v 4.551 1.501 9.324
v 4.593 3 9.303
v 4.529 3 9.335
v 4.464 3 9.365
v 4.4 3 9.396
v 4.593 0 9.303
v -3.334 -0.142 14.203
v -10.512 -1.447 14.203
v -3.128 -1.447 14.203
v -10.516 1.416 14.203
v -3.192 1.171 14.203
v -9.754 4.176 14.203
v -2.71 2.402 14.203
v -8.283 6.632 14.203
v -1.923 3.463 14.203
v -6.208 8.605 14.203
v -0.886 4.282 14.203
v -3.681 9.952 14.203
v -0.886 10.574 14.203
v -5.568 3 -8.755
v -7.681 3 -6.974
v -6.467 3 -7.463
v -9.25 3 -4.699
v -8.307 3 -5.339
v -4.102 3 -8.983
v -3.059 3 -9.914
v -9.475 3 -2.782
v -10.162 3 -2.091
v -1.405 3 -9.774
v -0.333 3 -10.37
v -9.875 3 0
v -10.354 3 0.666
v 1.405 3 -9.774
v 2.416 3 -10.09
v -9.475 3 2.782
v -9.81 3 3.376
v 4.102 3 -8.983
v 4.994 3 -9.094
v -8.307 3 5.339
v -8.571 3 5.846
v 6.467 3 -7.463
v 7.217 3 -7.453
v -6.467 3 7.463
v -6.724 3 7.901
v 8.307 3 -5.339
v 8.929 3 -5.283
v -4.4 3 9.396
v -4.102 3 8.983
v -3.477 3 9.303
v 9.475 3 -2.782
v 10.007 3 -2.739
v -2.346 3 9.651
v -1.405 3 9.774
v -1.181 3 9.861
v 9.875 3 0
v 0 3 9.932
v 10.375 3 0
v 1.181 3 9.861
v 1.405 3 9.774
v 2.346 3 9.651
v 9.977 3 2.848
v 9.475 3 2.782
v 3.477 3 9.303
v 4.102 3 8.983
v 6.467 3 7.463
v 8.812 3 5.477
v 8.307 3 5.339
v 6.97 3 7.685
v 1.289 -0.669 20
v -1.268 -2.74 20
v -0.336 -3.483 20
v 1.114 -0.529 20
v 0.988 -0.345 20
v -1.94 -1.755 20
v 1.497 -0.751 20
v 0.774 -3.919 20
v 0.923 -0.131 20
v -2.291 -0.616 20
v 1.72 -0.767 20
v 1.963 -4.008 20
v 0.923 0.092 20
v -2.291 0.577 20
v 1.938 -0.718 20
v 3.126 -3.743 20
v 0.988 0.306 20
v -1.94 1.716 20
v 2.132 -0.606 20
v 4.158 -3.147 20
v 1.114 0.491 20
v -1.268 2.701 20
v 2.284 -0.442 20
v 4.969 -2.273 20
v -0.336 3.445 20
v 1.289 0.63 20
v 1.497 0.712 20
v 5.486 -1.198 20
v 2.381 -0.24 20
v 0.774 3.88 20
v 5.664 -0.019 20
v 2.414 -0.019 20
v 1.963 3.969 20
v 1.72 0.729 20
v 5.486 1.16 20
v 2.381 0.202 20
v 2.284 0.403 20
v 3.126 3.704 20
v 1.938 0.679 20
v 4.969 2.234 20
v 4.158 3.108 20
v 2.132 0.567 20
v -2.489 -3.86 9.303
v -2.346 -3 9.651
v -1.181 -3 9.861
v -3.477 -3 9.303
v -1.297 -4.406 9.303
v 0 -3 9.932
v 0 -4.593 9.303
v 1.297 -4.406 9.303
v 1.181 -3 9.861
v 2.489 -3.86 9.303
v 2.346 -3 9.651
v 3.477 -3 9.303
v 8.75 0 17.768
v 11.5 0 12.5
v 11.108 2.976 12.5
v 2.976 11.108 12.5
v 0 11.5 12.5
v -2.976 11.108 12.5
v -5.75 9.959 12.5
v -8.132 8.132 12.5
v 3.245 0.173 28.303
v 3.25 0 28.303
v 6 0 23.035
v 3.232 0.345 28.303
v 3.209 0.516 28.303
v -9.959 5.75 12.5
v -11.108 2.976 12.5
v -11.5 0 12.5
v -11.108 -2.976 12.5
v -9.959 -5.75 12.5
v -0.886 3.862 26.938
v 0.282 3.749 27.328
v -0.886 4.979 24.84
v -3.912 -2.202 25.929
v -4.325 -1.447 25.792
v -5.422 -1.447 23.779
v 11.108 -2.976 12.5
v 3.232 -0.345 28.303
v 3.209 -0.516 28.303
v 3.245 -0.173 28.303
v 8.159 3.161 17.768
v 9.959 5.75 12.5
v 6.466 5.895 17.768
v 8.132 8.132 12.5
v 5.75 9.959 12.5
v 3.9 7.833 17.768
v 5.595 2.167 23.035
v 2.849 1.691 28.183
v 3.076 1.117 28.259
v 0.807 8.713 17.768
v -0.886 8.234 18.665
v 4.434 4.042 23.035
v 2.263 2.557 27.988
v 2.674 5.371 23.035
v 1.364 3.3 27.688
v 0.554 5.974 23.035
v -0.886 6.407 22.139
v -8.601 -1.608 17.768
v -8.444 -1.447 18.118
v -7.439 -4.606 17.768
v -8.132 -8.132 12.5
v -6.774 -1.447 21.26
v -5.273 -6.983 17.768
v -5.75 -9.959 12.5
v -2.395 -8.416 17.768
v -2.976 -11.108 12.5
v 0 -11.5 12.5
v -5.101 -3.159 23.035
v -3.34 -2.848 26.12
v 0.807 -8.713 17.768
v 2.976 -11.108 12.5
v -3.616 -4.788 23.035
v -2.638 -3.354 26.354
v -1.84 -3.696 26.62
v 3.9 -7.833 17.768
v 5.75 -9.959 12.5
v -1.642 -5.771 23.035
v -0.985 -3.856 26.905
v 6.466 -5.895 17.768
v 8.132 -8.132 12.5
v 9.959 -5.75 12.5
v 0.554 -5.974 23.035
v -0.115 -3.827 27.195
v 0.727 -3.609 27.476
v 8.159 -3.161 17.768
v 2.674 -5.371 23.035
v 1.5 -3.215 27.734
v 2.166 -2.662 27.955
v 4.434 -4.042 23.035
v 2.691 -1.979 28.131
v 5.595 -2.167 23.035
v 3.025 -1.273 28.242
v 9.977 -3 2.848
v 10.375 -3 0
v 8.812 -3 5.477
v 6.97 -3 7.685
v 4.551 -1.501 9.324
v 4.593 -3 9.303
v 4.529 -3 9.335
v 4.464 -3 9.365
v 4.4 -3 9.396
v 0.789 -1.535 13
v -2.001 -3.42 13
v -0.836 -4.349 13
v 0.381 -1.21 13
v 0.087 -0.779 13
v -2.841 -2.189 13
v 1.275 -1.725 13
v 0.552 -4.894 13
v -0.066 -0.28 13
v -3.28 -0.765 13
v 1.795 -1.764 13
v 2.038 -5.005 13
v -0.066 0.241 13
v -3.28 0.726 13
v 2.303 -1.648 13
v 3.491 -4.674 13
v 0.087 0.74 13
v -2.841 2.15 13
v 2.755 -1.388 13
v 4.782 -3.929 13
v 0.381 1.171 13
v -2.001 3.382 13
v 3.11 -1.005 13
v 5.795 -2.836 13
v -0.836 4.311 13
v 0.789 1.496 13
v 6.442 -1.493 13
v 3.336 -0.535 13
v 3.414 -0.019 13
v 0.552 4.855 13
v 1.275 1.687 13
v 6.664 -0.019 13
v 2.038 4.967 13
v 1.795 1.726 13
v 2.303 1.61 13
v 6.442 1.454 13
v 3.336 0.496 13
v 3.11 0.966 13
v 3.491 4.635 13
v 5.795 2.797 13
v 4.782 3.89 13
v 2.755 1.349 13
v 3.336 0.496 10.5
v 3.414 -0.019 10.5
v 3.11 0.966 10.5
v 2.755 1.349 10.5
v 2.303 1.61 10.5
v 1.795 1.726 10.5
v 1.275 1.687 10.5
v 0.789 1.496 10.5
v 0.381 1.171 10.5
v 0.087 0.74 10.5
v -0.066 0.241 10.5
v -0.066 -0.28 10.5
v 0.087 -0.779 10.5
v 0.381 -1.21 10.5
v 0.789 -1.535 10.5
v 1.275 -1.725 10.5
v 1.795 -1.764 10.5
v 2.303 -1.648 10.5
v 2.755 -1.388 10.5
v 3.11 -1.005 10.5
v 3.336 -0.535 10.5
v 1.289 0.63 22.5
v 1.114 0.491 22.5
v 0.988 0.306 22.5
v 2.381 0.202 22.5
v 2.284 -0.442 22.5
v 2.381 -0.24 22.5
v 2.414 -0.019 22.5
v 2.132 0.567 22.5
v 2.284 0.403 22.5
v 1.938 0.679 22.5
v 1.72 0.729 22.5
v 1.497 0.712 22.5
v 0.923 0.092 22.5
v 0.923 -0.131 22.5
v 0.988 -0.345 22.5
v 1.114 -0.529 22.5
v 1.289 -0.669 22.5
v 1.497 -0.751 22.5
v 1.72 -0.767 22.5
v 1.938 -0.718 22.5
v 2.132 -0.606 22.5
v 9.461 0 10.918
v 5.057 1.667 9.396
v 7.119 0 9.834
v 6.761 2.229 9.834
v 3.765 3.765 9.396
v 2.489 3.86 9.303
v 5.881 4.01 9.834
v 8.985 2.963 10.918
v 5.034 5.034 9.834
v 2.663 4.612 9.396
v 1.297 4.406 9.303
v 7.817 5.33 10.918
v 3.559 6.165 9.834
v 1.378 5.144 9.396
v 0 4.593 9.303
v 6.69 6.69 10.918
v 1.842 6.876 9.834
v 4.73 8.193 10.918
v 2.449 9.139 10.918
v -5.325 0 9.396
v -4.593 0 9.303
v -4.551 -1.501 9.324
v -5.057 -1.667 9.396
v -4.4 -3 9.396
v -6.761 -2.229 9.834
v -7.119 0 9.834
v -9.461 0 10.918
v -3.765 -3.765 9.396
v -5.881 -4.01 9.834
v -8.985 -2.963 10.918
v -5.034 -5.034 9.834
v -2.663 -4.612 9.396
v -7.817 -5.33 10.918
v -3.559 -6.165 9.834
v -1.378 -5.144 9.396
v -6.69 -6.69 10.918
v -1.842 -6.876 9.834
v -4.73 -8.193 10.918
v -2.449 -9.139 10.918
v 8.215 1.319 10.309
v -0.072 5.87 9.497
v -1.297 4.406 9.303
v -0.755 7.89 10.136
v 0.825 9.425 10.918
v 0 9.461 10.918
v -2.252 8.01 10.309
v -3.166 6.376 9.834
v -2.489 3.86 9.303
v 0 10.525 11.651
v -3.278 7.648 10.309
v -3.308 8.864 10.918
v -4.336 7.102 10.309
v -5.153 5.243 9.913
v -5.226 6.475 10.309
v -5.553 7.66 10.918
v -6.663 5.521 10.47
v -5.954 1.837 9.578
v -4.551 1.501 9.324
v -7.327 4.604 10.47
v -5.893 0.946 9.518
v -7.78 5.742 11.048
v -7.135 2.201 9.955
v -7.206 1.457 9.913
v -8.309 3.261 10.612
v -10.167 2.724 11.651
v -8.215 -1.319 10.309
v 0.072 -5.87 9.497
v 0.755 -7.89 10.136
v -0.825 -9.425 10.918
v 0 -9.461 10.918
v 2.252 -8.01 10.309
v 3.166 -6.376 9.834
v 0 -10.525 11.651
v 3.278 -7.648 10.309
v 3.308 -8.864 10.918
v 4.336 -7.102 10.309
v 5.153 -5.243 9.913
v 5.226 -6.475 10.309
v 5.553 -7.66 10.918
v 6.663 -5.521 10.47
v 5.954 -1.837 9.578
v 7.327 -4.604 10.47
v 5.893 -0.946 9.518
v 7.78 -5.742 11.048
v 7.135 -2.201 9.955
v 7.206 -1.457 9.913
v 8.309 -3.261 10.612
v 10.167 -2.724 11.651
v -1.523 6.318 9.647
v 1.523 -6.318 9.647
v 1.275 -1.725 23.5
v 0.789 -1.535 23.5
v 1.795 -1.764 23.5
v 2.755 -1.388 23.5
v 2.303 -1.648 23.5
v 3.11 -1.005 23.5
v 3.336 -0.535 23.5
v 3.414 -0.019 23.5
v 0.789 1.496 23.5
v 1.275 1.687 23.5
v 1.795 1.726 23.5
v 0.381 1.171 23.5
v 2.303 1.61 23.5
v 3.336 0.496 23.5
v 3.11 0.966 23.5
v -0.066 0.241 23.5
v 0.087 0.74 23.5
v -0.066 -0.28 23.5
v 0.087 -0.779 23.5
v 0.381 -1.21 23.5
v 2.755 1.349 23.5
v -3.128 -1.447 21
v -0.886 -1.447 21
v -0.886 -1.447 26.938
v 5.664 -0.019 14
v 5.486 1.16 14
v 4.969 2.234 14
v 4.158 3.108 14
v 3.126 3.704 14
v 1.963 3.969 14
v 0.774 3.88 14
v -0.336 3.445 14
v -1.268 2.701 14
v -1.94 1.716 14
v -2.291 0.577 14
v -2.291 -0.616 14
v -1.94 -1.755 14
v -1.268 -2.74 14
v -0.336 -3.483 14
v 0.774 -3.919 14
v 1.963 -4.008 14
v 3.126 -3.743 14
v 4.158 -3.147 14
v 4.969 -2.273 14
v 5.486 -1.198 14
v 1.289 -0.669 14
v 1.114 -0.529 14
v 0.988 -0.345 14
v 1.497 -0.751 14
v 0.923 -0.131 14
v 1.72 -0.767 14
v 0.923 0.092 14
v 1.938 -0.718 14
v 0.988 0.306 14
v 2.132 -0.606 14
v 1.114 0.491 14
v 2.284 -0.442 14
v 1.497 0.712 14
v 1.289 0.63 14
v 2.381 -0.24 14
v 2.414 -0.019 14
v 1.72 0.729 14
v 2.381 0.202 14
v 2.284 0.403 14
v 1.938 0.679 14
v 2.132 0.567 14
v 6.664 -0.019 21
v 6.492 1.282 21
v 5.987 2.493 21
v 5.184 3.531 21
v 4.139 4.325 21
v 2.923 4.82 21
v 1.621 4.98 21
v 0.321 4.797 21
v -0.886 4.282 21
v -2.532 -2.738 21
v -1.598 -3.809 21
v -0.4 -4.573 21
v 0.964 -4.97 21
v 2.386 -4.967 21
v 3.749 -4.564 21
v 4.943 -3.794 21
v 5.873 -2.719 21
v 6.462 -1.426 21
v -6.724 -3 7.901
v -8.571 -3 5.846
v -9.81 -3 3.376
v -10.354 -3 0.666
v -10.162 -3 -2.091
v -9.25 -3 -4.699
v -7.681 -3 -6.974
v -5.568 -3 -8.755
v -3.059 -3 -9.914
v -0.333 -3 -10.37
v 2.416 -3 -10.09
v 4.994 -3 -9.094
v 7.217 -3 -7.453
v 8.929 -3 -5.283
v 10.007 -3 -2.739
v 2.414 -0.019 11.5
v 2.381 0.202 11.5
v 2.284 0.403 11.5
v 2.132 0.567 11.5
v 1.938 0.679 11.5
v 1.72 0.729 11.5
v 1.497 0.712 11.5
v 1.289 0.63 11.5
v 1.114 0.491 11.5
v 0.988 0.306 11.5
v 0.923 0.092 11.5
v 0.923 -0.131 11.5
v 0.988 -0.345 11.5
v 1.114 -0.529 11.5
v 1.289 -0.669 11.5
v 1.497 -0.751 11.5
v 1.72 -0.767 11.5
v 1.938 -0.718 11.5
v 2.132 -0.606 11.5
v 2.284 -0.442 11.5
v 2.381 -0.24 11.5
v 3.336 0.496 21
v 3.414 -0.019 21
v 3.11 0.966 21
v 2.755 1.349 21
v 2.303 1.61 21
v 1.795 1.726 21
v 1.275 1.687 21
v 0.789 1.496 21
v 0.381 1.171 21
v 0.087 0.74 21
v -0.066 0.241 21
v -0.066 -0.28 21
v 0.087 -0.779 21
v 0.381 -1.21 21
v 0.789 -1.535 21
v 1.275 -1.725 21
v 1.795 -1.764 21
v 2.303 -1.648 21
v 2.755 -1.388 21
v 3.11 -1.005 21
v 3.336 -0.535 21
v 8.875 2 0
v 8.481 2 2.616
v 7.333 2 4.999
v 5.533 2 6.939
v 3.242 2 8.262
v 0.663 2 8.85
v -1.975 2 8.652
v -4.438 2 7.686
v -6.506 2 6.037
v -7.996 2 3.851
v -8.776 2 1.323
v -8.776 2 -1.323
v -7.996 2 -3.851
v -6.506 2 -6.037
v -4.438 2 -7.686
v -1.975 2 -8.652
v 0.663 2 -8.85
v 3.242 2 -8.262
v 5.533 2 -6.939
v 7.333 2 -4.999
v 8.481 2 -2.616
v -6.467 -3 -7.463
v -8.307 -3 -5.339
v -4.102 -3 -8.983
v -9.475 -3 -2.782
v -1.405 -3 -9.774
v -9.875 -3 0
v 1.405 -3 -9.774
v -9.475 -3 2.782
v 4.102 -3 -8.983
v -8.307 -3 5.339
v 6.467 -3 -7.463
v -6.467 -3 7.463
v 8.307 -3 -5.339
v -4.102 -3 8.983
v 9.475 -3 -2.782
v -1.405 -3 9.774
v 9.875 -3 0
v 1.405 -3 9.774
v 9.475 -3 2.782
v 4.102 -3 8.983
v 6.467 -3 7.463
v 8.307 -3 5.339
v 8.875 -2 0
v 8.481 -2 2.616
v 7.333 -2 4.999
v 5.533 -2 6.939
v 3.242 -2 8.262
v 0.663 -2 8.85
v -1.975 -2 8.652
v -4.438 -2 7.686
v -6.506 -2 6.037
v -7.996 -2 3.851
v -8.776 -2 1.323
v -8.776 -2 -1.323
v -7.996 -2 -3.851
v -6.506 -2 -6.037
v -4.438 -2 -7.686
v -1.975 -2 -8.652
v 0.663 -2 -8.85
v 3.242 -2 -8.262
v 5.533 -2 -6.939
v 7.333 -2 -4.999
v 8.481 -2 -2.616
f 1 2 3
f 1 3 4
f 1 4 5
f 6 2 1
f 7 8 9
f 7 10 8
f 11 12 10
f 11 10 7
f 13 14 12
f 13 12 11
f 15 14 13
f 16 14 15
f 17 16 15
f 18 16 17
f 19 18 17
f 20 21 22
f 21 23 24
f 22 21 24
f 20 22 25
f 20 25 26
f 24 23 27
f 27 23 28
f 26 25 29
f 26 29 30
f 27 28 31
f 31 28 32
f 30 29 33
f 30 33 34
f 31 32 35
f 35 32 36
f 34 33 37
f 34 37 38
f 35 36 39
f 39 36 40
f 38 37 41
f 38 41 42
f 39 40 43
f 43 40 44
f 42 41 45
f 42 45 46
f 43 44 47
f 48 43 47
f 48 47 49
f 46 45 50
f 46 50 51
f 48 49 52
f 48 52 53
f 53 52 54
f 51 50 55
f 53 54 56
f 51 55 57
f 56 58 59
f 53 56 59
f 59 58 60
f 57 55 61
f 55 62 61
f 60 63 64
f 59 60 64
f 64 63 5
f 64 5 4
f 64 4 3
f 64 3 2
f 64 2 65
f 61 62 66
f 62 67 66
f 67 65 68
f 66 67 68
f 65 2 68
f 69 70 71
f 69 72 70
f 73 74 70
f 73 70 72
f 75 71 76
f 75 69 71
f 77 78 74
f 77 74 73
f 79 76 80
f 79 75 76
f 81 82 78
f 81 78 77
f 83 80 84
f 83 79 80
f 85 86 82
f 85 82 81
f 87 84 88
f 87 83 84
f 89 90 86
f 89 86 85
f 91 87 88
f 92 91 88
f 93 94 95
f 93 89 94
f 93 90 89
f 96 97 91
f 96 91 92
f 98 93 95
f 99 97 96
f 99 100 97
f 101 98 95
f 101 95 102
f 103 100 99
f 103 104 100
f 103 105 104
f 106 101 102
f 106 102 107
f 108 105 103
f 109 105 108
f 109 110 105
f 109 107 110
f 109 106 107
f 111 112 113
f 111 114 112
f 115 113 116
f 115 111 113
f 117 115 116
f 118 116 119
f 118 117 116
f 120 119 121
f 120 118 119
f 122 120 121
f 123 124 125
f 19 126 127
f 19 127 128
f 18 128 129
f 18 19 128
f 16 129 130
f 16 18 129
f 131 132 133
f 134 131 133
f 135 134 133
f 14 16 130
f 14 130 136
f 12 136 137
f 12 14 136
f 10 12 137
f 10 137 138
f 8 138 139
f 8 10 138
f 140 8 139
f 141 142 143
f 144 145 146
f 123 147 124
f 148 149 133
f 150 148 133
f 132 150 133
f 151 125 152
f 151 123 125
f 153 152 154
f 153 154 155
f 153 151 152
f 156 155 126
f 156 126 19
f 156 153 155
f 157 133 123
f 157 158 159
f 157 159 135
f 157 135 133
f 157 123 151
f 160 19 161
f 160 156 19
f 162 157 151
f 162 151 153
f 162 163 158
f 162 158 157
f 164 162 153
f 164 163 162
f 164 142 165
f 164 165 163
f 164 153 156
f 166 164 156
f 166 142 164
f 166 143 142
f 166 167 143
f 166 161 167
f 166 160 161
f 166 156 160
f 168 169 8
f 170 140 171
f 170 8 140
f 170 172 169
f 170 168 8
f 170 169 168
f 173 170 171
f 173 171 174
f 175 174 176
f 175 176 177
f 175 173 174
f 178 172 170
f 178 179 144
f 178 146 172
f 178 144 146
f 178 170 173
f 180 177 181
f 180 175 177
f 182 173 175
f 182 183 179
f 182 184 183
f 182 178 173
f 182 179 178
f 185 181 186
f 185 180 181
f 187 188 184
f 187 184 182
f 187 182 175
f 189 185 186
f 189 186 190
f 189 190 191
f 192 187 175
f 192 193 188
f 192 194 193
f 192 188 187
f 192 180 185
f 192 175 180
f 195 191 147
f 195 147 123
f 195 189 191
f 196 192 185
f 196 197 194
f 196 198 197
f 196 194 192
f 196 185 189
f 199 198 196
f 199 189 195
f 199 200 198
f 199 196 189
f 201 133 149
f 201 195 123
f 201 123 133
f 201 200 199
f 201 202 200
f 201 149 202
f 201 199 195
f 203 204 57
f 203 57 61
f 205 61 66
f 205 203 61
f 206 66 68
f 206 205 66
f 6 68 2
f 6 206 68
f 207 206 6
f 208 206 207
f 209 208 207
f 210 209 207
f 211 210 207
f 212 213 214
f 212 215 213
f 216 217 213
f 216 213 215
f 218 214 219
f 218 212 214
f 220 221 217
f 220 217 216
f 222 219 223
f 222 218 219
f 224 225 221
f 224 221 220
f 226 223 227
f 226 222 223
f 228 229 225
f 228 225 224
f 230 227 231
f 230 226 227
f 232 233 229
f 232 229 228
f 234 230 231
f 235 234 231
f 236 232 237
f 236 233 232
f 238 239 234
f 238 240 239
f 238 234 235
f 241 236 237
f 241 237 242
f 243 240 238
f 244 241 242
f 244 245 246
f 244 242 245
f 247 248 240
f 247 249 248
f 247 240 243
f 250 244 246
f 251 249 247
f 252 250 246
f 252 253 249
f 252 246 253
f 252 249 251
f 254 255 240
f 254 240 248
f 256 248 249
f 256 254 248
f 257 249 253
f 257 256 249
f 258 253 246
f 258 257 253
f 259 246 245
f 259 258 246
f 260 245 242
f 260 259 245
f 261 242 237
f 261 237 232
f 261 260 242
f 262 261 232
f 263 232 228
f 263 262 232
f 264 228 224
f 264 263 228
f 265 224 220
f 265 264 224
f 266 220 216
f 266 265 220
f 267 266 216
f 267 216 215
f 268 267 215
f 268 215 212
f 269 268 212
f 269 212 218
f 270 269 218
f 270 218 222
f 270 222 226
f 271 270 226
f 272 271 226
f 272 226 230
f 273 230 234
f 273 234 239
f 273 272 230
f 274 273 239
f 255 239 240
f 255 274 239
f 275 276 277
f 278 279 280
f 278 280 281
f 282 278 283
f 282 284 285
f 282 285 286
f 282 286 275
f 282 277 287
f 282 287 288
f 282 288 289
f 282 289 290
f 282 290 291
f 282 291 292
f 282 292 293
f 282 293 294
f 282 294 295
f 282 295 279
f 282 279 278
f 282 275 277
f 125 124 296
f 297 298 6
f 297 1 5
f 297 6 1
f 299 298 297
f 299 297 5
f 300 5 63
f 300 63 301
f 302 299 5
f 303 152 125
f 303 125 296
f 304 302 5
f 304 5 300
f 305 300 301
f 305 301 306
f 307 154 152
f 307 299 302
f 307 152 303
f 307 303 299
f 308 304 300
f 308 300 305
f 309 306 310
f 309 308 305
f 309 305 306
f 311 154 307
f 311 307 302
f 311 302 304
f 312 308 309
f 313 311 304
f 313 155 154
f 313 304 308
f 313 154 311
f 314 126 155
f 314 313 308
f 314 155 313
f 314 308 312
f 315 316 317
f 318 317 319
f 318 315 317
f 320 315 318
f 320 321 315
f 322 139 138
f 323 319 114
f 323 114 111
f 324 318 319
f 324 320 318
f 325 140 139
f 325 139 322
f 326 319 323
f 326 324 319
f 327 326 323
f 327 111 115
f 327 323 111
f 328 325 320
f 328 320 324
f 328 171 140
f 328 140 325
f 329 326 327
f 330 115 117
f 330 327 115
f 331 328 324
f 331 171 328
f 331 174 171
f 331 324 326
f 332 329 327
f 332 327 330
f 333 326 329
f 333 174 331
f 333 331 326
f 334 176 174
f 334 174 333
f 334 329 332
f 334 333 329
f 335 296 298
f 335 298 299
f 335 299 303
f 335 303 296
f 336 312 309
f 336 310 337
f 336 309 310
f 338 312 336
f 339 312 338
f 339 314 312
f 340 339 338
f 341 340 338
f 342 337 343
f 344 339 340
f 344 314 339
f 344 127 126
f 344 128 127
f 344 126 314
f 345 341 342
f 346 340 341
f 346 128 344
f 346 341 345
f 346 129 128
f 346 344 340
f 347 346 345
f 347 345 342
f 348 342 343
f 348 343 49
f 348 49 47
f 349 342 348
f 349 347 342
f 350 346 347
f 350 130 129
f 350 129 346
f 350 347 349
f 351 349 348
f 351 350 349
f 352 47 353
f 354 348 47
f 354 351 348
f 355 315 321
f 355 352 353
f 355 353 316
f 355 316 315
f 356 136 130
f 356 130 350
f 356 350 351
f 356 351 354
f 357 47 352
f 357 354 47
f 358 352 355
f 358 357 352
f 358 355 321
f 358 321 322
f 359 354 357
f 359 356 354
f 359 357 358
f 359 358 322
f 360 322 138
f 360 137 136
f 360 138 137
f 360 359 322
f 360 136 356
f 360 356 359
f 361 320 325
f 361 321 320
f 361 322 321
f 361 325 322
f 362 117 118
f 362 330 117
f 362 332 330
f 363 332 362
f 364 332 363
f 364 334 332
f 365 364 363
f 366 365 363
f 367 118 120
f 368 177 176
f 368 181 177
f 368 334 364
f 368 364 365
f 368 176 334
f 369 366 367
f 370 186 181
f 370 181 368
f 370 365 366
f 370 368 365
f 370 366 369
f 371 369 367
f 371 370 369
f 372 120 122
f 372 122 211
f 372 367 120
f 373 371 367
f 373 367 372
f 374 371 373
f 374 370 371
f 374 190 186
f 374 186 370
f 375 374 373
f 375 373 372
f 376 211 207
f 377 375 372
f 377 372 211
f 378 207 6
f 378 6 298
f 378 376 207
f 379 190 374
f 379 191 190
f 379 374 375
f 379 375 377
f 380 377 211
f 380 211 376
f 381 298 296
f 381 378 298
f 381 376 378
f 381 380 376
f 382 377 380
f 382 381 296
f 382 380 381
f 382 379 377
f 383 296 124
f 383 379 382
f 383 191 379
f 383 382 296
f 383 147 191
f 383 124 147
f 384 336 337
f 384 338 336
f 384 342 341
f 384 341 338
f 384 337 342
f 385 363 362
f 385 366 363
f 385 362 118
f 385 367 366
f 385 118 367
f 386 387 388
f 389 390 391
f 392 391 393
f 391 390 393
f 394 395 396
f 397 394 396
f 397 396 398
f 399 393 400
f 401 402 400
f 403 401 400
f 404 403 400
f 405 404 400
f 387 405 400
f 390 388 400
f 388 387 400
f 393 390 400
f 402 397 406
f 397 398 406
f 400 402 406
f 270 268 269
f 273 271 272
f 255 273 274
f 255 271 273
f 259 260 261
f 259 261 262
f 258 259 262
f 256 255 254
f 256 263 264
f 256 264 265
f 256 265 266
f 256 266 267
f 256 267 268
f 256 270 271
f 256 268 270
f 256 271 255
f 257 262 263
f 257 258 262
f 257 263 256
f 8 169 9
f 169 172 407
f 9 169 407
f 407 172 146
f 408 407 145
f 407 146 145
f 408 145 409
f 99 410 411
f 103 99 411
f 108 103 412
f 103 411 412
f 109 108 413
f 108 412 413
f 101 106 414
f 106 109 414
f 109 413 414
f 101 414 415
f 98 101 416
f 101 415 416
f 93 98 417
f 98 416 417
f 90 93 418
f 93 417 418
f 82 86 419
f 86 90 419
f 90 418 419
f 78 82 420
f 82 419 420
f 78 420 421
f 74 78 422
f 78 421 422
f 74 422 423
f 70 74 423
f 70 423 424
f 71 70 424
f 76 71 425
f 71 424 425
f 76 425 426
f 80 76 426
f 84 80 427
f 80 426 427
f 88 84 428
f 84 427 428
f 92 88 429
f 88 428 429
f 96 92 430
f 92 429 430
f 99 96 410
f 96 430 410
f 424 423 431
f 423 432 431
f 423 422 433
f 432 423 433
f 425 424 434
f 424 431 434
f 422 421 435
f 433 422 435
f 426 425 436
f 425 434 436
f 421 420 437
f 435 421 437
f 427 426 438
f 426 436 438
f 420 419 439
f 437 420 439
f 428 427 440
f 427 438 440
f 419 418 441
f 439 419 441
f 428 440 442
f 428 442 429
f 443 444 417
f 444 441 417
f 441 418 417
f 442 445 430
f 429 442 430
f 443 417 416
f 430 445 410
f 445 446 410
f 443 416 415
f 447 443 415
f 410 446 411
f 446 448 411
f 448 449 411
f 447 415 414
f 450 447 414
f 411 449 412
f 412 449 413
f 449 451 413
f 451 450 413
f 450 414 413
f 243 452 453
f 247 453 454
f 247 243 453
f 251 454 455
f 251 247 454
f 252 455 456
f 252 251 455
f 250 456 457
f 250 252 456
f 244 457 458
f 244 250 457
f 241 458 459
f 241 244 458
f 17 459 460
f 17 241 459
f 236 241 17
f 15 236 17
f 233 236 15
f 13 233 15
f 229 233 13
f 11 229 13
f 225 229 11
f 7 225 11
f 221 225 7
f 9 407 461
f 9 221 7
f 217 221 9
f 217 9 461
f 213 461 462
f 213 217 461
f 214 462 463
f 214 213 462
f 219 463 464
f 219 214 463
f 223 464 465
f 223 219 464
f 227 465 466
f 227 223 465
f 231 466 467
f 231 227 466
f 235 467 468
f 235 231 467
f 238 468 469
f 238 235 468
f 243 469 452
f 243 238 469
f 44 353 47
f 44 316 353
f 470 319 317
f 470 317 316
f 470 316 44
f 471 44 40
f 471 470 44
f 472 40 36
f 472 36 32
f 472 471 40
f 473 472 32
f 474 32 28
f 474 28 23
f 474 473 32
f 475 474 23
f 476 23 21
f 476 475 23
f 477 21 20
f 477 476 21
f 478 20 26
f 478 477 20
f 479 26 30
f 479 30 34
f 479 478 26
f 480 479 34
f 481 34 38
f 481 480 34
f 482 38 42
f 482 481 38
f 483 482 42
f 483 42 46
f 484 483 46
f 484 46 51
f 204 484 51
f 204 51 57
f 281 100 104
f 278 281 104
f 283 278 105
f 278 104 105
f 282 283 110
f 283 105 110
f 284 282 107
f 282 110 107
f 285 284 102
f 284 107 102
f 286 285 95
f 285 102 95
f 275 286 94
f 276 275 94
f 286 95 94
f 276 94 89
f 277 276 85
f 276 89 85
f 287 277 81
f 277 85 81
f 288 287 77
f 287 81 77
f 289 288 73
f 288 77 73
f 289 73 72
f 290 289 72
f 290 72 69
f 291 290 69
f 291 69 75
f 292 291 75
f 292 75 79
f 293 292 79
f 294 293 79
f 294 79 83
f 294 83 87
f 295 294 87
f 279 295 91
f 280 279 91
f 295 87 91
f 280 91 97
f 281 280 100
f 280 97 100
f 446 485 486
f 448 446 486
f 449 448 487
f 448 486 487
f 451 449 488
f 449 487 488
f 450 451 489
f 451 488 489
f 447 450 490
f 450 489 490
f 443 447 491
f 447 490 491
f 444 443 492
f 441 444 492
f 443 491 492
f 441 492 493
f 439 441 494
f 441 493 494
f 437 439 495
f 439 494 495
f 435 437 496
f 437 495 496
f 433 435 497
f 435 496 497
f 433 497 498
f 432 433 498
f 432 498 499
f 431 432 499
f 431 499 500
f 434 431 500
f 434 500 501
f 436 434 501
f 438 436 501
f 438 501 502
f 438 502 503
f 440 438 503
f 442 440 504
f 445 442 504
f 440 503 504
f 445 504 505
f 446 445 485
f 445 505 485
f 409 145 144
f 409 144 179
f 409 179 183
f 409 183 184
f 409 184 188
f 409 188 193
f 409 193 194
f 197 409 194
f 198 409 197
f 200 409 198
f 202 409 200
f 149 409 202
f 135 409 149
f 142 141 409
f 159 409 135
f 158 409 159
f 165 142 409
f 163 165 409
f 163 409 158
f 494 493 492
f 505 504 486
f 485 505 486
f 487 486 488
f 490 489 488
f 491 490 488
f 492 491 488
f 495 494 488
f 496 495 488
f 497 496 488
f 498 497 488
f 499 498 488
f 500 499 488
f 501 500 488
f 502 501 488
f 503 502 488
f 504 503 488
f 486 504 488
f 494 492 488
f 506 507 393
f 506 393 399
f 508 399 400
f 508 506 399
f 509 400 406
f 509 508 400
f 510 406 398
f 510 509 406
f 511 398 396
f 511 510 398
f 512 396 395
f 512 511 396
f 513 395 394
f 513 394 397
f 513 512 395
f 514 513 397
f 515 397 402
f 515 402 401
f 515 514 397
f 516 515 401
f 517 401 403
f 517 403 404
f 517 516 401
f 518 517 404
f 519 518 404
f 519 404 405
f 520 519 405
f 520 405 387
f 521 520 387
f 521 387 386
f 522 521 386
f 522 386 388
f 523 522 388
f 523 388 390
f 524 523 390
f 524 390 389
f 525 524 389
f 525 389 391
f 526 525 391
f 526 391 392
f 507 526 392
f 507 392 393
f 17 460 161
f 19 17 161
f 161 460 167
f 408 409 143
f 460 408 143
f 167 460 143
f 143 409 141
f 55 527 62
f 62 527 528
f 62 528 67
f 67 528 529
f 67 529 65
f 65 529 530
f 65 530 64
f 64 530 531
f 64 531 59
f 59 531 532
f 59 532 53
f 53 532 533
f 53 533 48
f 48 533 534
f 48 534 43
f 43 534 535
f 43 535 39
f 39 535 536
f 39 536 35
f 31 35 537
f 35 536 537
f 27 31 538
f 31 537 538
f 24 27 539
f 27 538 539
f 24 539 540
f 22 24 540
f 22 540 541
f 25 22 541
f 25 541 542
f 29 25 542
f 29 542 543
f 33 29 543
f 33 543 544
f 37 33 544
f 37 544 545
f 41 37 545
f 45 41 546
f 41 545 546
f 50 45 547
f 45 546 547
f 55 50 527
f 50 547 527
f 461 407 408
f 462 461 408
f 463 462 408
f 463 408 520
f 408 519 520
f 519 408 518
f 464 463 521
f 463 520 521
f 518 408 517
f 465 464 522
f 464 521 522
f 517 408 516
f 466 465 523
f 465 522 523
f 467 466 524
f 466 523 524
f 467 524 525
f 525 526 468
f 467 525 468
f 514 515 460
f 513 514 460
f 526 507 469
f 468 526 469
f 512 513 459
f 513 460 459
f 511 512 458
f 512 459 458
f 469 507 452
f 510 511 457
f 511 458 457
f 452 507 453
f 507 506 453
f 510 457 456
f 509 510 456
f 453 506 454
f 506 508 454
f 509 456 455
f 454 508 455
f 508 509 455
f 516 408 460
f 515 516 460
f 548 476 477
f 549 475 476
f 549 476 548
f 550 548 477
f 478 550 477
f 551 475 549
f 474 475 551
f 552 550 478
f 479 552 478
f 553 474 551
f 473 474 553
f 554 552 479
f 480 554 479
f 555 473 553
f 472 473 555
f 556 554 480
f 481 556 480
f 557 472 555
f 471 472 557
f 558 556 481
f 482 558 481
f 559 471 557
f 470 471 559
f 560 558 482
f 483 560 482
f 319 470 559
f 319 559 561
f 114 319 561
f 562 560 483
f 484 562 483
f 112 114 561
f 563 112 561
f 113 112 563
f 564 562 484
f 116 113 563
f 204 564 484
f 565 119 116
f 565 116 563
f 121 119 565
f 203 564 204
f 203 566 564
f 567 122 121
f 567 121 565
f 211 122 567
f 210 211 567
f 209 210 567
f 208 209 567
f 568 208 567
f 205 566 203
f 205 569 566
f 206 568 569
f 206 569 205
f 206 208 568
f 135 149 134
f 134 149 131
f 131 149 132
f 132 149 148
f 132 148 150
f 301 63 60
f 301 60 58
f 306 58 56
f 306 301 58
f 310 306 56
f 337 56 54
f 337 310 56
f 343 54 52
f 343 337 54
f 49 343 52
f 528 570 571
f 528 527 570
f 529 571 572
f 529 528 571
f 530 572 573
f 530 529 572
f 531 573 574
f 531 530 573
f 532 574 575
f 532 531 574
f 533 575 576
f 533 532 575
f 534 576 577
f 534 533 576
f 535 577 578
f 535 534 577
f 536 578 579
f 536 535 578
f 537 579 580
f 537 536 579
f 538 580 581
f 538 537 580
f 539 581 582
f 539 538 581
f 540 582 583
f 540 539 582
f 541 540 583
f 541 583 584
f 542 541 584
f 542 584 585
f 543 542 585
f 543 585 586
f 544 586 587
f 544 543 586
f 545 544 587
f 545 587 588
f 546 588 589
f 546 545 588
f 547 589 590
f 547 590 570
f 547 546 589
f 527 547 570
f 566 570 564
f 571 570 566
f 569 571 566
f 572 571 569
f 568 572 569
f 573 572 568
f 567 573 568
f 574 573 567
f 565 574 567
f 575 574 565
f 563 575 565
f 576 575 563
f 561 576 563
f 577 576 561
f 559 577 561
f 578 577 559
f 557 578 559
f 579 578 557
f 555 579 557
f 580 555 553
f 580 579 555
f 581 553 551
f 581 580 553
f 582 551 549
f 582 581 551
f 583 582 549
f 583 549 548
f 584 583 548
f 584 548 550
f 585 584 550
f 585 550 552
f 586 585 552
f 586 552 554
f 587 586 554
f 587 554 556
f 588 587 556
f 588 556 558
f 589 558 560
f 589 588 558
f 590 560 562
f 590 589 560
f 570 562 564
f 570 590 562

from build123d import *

# Parameters (mm, degrees)
F0_R           = 8.875
F3_DEPTH       = 3
F3_DEPTH_BACK  = 3
F4_SIZE        = 1
F6_DEPTH       = 14.1
F8_START       = 13.5
F7_R           = 4
F7_R_2         = 1.75
F7_R_3         = 0.75
F8_DEPTH       = 6.5
F10_START      = 13
F7_R_4         = 5
F7_R_5         = 4.5
F10_DEPTH      = 8
F11_START      = 13
F11_DEPTH      = 1
F12_START      = 20
F12_DEPTH      = 1
F13_START      = 10.5
F13_DEPTH      = 2.5
F14_START      = 20
F14_DEPTH      = 3.5
F15_START      = 11.5
F15_DEPTH      = 2.5
F16_START      = 20
F16_DEPTH      = 2.5
F20_DEPTH      = 25
F20_DEPTH_BACK = 25


# Not quite as in the source:
# - a feature names something its author has since deleted; it is built from what else it names


with BuildPart() as f2:
    # F0 (on Front) → F2 (revolve)
    with BuildSketch(Plane.XZ):
        with BuildLine():
            ThreePointArc((0, 10.375), (2.3580401671, 10.1034781917), (4.5926568488, 9.3031246401))
            ThreePointArc((4.5926568488, 9.3031246401), (8.3205085843, 10.3091537222), (11.5, 12.5))
            Line((11.5, 12.5), (3.25, 28.3031246401))
            Line((3.25, 28.3031246401), (0, 28.3031246401))
            Line((0, 28.3031246401), (0, 10.375))
        make_face()
    revolve(axis=Axis((0, 0, 0), (0, 0, 1)))

    # F0 (on Front) → F3 (join, two sides)
    with BuildSketch(Plane.XZ) as f3_sk:
        with BuildLine():
            ThreePointArc((0, 10.375), (-7.3362328548, -7.3362328548), (10.375, 0))
            ThreePointArc((10.375, 0), (8.8116241354, 5.4768517505), (4.5926568488, 9.3031246401))
            Line((4.5926568488, 9.3031246401), (0, 9.3031246401))
            Line((0, 9.3031246401), (0, 10.375))
        make_face()
        Circle(F0_R, mode=Mode.SUBTRACT)
        with BuildLine():
            Line((0, 9.3031246401), (4.5926568488, 9.3031246401))
            ThreePointArc((4.5926568488, 9.3031246401), (2.3580401671, 10.1034781917), (0, 10.375))
            Line((0, 10.375), (0, 9.3031246401))
        make_face()
    extrude(amount=F3_DEPTH)
    extrude(f3_sk.sketch, amount=-F3_DEPTH_BACK)

    # F4
    f4_edges = [f2.edges().sort_by_distance(p)[0] for p in [
        (-8.875, -3, 0),
        (-8.875, 3, 0),
    ]]
    chamfer(f4_edges, length=F4_SIZE)

    # F5 (on face) → F6 (cut)
    with BuildSketch(Plane.XY.offset(28.3031246401)):
        with BuildLine():
            Line((-0.8858618094, 14.4863697807), (-16.5064213391, -1.4472623589))
            Line((-16.5064213391, -1.4472623589), (-2.9099710763, -1.4472623589))
            ThreePointArc((-2.9099710763, -1.4472623589), (-2.9720223474, 1.3151361779), (-0.8858618094, 3.1269392151))
            Line((-0.8858618094, 3.1269392151), (-0.8858618094, 14.4863697807))
        make_face()
        with BuildLine():
            ThreePointArc((-0.8858618094, 3.1269392151), (-2.9720223474, 1.3151361779), (-2.9099710763, -1.4472623589))
            Line((-2.9099710763, -1.4472623589), (-0.8858618094, -1.4472623589))
            Line((-0.8858618094, -1.4472623589), (-0.8858618094, 3.1269392151))
        make_face()
    extrude(amount=-F6_DEPTH, mode=Mode.SUBTRACT)

    # F7 (on Top) → F8 (join)
    with BuildSketch(Plane.XY.offset(F8_START)):
        with Locations((1.6641381906, -0.0193633477)):
            Circle(F7_R)
        with Locations((1.6641381906, -0.0193633477)):
            Circle(F7_R_2, mode=Mode.SUBTRACT)
        with Locations((1.6641381906, -0.0193633477)):
            Circle(F7_R_2)
        with Locations((1.6641381906, -0.0193633477)):
            Circle(F7_R_3, mode=Mode.SUBTRACT)
        with Locations((1.6641381906, -0.0193633477)):
            Circle(F7_R_3)
    extrude(amount=F8_DEPTH)

    # F7 (on Top) → F10 (cut)
    with BuildSketch(Plane.XY.offset(F10_START)):
        with Locations((1.6641381906, -0.0193633477)):
            Circle(F7_R_4)
        with Locations((1.6641381906, -0.0193633477)):
            Circle(F7_R_5, mode=Mode.SUBTRACT)
        with Locations((1.6641381906, -0.0193633477)):
            Circle(F7_R_5)
        with Locations((1.6641381906, -0.0193633477)):
            Circle(F7_R, mode=Mode.SUBTRACT)
    extrude(amount=F10_DEPTH, mode=Mode.SUBTRACT)

    # F7 (on Top) → F11 (cut)
    with BuildSketch(Plane.XY.offset(F11_START)):
        with Locations((1.6641381906, -0.0193633477)):
            Circle(F7_R_4)
        with Locations((1.6641381906, -0.0193633477)):
            Circle(F7_R_5, mode=Mode.SUBTRACT)
        with Locations((1.6641381906, -0.0193633477)):
            Circle(F7_R_5)
        with Locations((1.6641381906, -0.0193633477)):
            Circle(F7_R, mode=Mode.SUBTRACT)
        with Locations((1.6641381906, -0.0193633477)):
            Circle(F7_R)
        with Locations((1.6641381906, -0.0193633477)):
            Circle(F7_R_2, mode=Mode.SUBTRACT)
        with Locations((1.6641381906, -0.0193633477)):
            Circle(F7_R_2)
        with Locations((1.6641381906, -0.0193633477)):
            Circle(F7_R_3, mode=Mode.SUBTRACT)
        with Locations((1.6641381906, -0.0193633477)):
            Circle(F7_R_3)
    extrude(amount=F11_DEPTH, mode=Mode.SUBTRACT)

    # F7 (on Top) → F12 (cut)
    with BuildSketch(Plane.XY.offset(F12_START)):
        with Locations((1.6641381906, -0.0193633477)):
            Circle(F7_R_4)
        with Locations((1.6641381906, -0.0193633477)):
            Circle(F7_R_5, mode=Mode.SUBTRACT)
        with Locations((1.6641381906, -0.0193633477)):
            Circle(F7_R_5)
        with Locations((1.6641381906, -0.0193633477)):
            Circle(F7_R, mode=Mode.SUBTRACT)
        with Locations((1.6641381906, -0.0193633477)):
            Circle(F7_R)
        with Locations((1.6641381906, -0.0193633477)):
            Circle(F7_R_2, mode=Mode.SUBTRACT)
        with Locations((1.6641381906, -0.0193633477)):
            Circle(F7_R_2)
        with Locations((1.6641381906, -0.0193633477)):
            Circle(F7_R_3, mode=Mode.SUBTRACT)
        with Locations((1.6641381906, -0.0193633477)):
            Circle(F7_R_3)
    extrude(amount=F12_DEPTH, mode=Mode.SUBTRACT)

    # F7 (on Top) → F13 (cut)
    with BuildSketch(Plane.XY.offset(F13_START)):
        with Locations((1.6641381906, -0.0193633477)):
            Circle(F7_R_2)
        with Locations((1.6641381906, -0.0193633477)):
            Circle(F7_R_3, mode=Mode.SUBTRACT)
        with Locations((1.6641381906, -0.0193633477)):
            Circle(F7_R_3)
    extrude(amount=F13_DEPTH, mode=Mode.SUBTRACT)

    # F7 (on Top) → F14 (cut)
    with BuildSketch(Plane.XY.offset(F14_START)):
        with Locations((1.6641381906, -0.0193633477)):
            Circle(F7_R_2)
        with Locations((1.6641381906, -0.0193633477)):
            Circle(F7_R_3, mode=Mode.SUBTRACT)
        with Locations((1.6641381906, -0.0193633477)):
            Circle(F7_R_3)
    extrude(amount=F14_DEPTH, mode=Mode.SUBTRACT)

    # F7 (on Top) → F15 (join)
    with BuildSketch(Plane.XY.offset(F15_START)):
        with Locations((1.6641381906, -0.0193633477)):
            Circle(F7_R_3)
    extrude(amount=F15_DEPTH)

    # F7 (on Top) → F16 (join)
    with BuildSketch(Plane.XY.offset(F16_START)):
        with Locations((1.6641381906, -0.0193633477)):
            Circle(F7_R_3)
    extrude(amount=F16_DEPTH)

    # F19 (on Front) → F20 (cut, two sides)
    with BuildSketch(Plane.XZ) as f20_sk:
        Polygon((-4.3850070654, 28.8974568248), (-4.594437778, 25.7020443678), (4.991795402, 28.8974568248), align=None)
    extrude(amount=-F20_DEPTH, mode=Mode.SUBTRACT)
    extrude(f20_sk.sketch, amount=F20_DEPTH_BACK, mode=Mode.SUBTRACT)


solid = f2.part
